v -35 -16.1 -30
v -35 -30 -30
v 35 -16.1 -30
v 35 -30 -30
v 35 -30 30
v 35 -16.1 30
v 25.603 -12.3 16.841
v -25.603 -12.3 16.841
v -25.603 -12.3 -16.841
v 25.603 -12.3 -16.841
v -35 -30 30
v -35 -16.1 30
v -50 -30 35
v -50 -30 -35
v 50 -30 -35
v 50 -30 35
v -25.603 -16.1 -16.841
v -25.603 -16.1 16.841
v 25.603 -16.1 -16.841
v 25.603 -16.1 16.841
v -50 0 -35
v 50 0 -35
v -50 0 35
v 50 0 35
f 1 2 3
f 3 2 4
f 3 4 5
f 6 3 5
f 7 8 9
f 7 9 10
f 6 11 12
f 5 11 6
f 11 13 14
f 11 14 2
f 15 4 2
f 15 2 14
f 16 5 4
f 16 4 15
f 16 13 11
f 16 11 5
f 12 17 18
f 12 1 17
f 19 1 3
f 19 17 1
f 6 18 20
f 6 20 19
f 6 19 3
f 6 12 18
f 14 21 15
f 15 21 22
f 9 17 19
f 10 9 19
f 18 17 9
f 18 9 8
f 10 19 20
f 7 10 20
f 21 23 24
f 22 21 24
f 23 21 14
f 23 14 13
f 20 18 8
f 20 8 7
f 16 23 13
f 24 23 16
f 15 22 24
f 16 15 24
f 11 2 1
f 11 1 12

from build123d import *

# Parameters (mm, degrees)
F0_W     = 100
F0_H     = 70
F1_DEPTH = 30
F2_W     = 70
F2_H     = 60
F3_DEPTH = 13.9
F4_W     = 51.206012
F4_H     = 33.682036
F5_DEPTH = 3.8


with BuildPart() as f1:
    # F0 (on Front) → F1 (new body)
    with BuildSketch(Plane.XZ):
        Rectangle(F0_W, F0_H)
    extrude(amount=F1_DEPTH)

    # F2 (on face) → F3 (cut)
    with BuildSketch(Plane.XZ.offset(30)):
        Rectangle(F2_W, F2_H)
    extrude(amount=-F3_DEPTH, mode=Mode.SUBTRACT)

    # F4 (on face) → F5 (cut)
    with BuildSketch(Plane.XZ.offset(16.1)):
        Rectangle(F4_W, F4_H)
    extrude(amount=-F5_DEPTH, mode=Mode.SUBTRACT)


solid = f1.part
